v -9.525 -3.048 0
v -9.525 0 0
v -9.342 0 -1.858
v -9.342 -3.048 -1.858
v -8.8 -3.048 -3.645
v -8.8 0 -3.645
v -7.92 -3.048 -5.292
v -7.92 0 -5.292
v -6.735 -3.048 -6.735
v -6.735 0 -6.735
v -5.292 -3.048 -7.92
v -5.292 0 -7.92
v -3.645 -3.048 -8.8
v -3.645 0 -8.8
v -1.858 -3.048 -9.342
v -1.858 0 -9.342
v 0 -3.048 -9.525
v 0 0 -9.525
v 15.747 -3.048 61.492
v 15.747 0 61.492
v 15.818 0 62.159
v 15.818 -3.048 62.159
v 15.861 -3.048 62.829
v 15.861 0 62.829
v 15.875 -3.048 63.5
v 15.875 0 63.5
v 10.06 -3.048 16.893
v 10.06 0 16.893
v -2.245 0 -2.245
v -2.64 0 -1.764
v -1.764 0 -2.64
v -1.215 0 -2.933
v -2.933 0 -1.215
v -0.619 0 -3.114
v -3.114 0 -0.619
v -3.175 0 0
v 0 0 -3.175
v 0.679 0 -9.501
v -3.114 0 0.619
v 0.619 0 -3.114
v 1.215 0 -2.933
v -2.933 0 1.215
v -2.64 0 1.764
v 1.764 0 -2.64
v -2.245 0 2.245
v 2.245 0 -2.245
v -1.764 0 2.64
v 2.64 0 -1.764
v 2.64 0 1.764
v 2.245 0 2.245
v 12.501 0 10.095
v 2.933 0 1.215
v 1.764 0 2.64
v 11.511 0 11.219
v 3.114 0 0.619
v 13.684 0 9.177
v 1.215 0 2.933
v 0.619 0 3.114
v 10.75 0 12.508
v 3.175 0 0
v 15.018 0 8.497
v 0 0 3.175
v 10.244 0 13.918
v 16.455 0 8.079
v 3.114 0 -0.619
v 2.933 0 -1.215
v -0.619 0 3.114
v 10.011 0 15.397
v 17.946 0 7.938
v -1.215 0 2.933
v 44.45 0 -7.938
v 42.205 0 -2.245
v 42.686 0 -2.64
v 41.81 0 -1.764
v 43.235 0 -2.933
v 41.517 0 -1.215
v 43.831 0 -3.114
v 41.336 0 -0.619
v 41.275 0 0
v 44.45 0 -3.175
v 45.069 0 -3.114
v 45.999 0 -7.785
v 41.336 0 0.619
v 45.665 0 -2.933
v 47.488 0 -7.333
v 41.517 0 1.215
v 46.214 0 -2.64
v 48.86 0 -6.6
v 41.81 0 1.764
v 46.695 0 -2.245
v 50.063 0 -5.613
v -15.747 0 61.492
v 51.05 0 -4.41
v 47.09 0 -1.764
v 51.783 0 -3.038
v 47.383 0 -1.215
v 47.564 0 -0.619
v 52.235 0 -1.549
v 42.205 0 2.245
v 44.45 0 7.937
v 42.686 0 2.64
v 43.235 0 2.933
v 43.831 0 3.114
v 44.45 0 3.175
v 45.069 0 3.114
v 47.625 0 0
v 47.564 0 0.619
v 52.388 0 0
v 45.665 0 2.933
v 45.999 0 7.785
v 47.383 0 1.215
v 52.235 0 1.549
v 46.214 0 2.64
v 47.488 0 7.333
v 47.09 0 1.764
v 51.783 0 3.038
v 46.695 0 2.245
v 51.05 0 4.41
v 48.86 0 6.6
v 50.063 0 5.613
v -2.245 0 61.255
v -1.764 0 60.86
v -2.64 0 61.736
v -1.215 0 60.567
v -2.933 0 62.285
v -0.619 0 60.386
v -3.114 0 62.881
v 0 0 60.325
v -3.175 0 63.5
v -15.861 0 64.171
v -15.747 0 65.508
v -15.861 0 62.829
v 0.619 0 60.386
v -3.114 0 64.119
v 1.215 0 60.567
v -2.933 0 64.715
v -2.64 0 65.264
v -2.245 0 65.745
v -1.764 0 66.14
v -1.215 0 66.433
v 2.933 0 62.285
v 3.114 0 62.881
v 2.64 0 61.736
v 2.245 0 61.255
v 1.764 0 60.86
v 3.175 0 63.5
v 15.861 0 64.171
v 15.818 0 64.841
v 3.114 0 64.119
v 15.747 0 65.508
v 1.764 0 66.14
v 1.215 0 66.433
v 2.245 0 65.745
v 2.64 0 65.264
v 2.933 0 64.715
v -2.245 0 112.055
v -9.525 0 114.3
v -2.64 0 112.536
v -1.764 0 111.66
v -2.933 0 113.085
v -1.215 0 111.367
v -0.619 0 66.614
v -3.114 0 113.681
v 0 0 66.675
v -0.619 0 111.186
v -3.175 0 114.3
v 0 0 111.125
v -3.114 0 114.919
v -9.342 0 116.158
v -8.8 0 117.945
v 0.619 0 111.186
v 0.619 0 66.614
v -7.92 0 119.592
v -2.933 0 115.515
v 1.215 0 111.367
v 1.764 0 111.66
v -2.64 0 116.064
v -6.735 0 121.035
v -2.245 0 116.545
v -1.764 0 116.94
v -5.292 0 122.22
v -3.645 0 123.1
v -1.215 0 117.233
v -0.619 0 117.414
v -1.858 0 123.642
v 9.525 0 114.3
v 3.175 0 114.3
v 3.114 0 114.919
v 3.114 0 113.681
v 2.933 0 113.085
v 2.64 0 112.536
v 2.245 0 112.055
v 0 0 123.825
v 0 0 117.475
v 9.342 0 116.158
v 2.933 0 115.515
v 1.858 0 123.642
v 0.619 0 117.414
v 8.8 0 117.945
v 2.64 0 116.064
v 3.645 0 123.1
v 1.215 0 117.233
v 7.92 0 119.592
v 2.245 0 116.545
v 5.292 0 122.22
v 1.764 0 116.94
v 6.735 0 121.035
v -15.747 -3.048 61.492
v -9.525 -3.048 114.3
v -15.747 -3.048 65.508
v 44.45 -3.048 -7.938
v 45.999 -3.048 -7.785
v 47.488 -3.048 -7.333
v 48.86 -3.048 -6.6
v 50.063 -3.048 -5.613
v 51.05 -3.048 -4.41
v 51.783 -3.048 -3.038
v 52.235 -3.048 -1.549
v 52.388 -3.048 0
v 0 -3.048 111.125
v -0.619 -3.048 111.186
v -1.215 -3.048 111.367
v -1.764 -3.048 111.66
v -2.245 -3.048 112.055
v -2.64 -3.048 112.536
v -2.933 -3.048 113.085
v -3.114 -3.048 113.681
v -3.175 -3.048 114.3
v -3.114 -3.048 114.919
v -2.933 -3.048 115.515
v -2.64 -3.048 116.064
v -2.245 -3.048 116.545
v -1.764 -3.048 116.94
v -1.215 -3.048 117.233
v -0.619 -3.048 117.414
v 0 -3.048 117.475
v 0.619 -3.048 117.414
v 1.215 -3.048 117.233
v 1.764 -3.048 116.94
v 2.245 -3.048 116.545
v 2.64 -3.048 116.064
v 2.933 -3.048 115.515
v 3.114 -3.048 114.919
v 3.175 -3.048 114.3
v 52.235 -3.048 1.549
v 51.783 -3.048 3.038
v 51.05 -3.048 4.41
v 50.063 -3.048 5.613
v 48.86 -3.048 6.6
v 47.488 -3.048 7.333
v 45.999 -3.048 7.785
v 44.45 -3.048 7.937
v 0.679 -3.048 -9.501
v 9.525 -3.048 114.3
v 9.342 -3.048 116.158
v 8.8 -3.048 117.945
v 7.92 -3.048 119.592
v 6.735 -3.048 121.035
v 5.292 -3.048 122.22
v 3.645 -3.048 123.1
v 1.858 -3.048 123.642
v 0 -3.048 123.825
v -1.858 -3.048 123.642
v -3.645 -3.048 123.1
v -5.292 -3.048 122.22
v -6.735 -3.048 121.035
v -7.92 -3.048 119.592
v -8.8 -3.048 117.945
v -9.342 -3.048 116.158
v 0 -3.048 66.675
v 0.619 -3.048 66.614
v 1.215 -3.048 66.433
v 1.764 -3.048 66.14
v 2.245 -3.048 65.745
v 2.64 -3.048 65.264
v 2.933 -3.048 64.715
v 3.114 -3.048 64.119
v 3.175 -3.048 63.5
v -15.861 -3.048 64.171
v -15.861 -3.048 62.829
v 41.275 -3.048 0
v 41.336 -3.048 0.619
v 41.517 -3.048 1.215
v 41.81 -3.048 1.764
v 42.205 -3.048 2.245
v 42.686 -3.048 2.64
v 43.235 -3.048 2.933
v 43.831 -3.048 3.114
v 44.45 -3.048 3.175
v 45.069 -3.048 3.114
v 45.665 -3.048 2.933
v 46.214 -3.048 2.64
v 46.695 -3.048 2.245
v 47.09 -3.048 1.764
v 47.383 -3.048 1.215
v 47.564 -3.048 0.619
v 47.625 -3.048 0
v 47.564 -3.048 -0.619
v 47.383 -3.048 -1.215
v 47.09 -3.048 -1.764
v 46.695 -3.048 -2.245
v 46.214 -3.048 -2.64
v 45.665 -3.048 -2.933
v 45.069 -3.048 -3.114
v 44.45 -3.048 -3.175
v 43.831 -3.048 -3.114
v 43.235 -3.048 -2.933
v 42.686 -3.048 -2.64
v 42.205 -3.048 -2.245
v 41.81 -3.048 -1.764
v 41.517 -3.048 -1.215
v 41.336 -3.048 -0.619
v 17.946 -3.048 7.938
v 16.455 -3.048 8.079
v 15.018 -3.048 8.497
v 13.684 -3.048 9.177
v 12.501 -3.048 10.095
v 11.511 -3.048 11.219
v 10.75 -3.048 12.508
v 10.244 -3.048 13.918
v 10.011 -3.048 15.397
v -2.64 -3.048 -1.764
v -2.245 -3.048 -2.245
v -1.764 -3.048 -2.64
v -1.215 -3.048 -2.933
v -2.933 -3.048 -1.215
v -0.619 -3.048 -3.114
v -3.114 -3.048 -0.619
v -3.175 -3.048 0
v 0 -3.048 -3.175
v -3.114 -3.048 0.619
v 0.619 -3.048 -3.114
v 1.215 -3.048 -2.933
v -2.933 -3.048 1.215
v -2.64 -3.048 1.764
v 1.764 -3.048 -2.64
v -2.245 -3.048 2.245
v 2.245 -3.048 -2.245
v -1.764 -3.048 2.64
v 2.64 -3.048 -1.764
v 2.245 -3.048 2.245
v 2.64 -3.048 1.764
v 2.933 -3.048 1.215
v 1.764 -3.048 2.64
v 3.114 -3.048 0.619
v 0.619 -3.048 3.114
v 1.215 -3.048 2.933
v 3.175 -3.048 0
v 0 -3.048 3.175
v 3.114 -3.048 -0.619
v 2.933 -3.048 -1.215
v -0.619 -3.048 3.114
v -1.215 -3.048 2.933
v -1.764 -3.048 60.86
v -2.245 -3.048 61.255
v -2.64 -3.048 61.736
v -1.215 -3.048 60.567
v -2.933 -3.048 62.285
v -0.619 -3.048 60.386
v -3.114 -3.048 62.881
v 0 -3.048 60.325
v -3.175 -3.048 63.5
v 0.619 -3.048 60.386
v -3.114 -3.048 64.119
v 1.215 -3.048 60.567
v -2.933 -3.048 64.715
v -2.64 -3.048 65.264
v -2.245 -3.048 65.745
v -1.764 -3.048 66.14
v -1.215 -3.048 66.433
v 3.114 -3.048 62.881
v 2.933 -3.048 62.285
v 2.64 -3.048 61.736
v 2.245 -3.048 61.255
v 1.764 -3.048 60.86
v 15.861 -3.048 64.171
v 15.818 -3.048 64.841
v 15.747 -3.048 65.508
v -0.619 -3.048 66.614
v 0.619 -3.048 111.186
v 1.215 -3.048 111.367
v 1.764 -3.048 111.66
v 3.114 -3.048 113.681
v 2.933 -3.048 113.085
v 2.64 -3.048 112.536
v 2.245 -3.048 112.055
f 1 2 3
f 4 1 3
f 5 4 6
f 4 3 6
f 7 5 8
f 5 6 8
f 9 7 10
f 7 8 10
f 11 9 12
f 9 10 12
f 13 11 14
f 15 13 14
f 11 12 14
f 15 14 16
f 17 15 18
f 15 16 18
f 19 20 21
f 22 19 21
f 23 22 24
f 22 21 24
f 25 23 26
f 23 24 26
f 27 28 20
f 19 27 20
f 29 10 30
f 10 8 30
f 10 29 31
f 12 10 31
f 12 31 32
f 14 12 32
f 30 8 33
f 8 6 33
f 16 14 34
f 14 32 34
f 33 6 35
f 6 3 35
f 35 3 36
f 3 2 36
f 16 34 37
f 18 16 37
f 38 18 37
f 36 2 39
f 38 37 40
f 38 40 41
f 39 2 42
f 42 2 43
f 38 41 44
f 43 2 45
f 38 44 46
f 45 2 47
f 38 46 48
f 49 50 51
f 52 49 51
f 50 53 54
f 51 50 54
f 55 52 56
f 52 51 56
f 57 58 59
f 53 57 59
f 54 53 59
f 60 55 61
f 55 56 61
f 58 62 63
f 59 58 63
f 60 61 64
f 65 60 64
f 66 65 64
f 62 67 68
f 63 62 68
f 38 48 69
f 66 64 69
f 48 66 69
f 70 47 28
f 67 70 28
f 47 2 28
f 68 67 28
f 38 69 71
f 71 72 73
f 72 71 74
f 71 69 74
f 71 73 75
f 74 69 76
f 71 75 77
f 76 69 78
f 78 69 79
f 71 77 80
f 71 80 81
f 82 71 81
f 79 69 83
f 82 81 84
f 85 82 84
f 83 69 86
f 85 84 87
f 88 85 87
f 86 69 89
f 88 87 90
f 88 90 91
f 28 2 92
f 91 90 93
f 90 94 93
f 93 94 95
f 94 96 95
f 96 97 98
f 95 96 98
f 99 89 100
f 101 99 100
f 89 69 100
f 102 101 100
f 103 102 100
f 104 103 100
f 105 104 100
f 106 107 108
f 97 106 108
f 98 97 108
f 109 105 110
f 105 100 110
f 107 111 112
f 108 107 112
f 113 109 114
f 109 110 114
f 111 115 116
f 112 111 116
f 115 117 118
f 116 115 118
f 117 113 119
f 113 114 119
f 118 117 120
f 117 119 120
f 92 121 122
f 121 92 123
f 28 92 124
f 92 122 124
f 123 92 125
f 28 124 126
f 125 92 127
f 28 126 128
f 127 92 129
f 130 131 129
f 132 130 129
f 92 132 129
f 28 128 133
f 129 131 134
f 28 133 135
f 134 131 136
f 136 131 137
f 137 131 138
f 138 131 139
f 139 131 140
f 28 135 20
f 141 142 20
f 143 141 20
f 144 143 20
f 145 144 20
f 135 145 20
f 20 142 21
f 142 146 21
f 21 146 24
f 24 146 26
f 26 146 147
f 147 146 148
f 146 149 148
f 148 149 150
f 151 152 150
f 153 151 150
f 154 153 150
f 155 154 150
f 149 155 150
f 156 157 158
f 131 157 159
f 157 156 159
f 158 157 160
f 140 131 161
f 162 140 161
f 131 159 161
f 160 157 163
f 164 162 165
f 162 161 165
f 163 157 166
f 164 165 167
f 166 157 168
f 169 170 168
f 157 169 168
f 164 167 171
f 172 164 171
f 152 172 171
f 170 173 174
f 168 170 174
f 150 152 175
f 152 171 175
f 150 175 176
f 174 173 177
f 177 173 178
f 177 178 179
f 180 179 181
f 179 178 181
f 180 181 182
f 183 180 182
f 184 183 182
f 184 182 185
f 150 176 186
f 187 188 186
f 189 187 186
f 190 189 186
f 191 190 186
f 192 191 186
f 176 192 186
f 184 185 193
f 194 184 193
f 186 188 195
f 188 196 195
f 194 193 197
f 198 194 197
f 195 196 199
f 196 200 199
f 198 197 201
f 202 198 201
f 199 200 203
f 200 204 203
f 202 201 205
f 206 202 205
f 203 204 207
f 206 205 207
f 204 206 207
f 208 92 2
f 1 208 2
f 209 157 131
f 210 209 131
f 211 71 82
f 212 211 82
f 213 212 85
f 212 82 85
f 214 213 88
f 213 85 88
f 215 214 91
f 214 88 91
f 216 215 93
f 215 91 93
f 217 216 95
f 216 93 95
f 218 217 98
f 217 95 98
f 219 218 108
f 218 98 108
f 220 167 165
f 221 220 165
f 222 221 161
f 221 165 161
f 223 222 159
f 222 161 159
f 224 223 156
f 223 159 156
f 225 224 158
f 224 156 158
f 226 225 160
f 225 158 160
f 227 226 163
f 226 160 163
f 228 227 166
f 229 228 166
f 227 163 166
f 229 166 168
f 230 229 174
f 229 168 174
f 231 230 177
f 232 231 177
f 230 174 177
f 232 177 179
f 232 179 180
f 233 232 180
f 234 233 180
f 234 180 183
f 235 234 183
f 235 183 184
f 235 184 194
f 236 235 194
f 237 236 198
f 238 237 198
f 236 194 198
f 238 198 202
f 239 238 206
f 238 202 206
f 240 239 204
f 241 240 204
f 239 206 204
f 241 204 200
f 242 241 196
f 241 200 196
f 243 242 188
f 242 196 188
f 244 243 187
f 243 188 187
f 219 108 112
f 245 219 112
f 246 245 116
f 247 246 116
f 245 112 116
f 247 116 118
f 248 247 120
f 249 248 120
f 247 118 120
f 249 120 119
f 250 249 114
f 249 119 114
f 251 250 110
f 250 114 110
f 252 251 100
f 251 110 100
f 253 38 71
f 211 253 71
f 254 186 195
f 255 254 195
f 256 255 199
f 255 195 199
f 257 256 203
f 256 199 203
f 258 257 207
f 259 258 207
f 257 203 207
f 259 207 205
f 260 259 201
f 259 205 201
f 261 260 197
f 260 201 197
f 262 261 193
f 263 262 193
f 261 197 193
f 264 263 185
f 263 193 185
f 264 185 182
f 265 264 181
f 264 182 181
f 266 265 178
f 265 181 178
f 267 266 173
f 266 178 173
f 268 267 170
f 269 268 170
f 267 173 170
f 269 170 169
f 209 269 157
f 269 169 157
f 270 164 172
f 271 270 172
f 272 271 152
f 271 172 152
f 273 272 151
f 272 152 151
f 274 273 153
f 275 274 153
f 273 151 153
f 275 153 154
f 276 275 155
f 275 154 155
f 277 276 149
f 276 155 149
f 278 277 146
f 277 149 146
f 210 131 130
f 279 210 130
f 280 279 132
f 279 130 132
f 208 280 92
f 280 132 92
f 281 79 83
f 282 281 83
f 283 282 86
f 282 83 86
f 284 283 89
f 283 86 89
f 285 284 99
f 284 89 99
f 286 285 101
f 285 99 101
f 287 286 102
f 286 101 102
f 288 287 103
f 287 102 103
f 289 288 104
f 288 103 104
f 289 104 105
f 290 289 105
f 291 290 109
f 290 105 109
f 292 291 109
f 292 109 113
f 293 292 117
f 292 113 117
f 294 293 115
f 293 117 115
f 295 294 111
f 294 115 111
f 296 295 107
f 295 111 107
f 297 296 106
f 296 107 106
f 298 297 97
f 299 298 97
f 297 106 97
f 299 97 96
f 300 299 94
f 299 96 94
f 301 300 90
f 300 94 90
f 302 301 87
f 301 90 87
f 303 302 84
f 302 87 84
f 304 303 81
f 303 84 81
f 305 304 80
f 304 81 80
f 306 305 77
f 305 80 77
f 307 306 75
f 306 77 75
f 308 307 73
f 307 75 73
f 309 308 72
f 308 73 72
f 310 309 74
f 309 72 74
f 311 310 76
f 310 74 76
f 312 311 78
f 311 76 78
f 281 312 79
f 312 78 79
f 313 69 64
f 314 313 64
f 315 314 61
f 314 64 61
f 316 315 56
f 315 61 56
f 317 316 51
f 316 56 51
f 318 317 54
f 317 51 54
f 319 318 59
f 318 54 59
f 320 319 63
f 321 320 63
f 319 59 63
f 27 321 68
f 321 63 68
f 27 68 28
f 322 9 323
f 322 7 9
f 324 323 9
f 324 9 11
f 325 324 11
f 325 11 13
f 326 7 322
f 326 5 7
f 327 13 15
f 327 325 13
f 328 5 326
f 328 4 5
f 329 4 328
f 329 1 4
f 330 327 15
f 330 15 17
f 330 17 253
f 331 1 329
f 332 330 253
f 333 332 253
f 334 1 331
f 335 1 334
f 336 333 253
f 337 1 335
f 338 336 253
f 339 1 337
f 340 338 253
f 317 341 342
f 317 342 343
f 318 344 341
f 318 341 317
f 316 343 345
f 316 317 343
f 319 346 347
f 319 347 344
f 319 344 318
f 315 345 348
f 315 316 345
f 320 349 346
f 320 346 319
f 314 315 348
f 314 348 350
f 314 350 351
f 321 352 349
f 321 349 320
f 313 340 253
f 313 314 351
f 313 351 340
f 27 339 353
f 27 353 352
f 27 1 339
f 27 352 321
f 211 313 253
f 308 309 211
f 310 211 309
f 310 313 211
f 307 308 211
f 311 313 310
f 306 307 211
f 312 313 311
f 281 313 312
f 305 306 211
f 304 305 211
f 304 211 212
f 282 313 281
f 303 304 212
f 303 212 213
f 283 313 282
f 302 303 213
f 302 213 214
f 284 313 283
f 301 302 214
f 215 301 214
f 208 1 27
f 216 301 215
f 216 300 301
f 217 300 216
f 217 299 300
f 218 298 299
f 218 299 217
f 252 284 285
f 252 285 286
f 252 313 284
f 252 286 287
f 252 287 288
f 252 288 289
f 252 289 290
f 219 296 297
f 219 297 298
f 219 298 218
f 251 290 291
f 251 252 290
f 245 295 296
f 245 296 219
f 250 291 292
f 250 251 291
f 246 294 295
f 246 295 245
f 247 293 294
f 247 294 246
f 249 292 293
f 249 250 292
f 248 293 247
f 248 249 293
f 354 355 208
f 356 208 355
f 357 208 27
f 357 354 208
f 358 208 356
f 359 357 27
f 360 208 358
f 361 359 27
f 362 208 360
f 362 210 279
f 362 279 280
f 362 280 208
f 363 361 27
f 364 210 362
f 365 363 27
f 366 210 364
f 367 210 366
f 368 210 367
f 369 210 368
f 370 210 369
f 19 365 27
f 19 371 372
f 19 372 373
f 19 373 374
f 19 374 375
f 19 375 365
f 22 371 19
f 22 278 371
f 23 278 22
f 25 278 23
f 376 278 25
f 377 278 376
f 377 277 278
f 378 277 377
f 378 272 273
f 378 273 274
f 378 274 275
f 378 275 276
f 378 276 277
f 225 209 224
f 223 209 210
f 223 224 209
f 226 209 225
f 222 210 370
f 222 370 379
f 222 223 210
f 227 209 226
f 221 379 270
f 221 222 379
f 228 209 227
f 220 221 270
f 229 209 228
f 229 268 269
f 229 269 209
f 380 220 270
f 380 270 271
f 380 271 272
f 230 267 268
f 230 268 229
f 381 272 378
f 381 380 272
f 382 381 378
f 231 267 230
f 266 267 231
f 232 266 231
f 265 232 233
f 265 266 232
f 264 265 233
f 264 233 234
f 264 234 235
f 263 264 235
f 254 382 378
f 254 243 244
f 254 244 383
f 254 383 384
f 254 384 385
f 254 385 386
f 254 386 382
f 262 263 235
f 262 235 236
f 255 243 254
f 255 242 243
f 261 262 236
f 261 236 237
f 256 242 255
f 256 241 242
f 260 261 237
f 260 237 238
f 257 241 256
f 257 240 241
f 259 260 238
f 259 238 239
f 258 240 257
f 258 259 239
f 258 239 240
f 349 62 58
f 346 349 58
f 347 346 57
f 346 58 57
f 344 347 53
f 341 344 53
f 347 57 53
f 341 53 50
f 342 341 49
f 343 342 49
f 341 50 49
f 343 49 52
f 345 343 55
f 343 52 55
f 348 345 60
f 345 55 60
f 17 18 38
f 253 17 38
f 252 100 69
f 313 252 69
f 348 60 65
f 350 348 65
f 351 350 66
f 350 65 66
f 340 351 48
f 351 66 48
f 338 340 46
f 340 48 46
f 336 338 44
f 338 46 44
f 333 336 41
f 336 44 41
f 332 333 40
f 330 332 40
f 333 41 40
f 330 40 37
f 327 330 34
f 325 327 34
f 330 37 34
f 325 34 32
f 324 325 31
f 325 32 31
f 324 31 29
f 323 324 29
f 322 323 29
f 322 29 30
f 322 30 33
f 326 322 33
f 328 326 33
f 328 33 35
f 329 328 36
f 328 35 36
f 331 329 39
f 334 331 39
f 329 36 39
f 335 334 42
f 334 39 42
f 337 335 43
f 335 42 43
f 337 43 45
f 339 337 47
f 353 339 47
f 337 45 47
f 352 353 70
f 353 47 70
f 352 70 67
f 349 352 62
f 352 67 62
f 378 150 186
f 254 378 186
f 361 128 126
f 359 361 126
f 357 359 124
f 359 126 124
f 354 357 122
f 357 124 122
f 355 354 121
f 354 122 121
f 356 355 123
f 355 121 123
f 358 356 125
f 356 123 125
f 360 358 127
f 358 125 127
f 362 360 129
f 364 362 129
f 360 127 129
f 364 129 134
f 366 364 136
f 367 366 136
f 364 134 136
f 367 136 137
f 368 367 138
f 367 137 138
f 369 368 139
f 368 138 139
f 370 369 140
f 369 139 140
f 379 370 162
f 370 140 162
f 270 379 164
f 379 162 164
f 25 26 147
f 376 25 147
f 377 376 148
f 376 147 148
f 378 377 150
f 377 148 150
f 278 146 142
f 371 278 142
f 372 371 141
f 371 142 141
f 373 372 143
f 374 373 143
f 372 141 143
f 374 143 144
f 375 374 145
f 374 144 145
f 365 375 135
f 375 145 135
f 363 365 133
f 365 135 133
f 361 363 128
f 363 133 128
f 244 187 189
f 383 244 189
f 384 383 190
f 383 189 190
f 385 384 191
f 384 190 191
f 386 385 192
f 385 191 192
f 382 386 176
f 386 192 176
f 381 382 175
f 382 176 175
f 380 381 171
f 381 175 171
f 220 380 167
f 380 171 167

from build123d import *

# Parameters (mm, degrees)
F1_DEPTH = 3.048


with BuildPart() as f1:
    # F0 (on Front) → F1 (new body)
    with BuildSketch(Plane.XZ):
        with BuildLine():
            Line((-9.525, 114.3), (-15.7474569047, 65.5082893304))
            ThreePointArc((-15.7474569047, 65.5082893304), (-10.4912828548, 75.4142187767), (0, 79.375))
            Line((0, 79.375), (0, 104.775))
            ThreePointArc((0, 104.775), (-6.7351920908, 107.5648079092), (-9.525, 114.3))
        make_face()
        with BuildLine():
            Line((0, 104.775), (0, 79.375))
            ThreePointArc((0, 79.375), (10.4912828548, 75.4142187767), (15.7474569047, 65.5082893304))
            Line((15.7474569047, 65.5082893304), (9.525, 114.3))
            ThreePointArc((9.525, 114.3), (6.7351920908, 107.5648079092), (0, 104.775))
        make_face()
        with BuildLine():
            ThreePointArc((9.525, 114.3), (0, 123.825), (-9.525, 114.3))
            ThreePointArc((-9.525, 114.3), (-6.7351920908, 107.5648079092), (0, 104.775))
            ThreePointArc((0, 104.775), (6.7351920908, 107.5648079092), (9.525, 114.3))
        make_face()
        with BuildLine():
            ThreePointArc((3.175, 114.3), (2.2450640303, 112.0549359697), (0, 111.125))
            ThreePointArc((0, 111.125), (-2.2450640303, 116.5450640303), (3.175, 114.3))
        make_face(mode=Mode.SUBTRACT)
        with BuildLine():
            ThreePointArc((-15.7474569047, 61.4917106696), (-10.4912828548, 51.5857812233), (0, 47.625))
            Line((0, 47.625), (0, 60.325))
            ThreePointArc((0, 60.325), (-3.175, 63.5), (0, 66.675))
            Line((0, 66.675), (0, 79.375))
            ThreePointArc((0, 79.375), (-10.4912828548, 75.4142187767), (-15.7474569047, 65.5082893304))
            ThreePointArc((-15.7474569047, 65.5082893304), (-15.875, 63.5), (-15.7474569047, 61.4917106696))
        make_face()
        with BuildLine():
            ThreePointArc((-9.525, 0), (-6.7351920908, 6.7351920908), (0, 9.525))
            Line((0, 9.525), (0, 47.625))
            ThreePointArc((0, 47.625), (-10.4912828548, 51.5857812233), (-15.7474569047, 61.4917106696))
            Line((-15.7474569047, 61.4917106696), (-9.525, 0))
        make_face()
        with BuildLine():
            Line((0, 47.625), (0, 9.525))
            ThreePointArc((0, 9.525), (6.7351920908, 6.7351920908), (9.525, 0))
            Line((9.525, 0), (36.5125, 0))
            ThreePointArc((36.5125, 0), (38.8373399243, 5.6126600757), (44.45, 7.9375))
            Line((44.45, 7.9375), (17.9461215627, 7.9375))
            ThreePointArc((17.9461215627, 7.9375), (11.9794807993, 10.6336655463), (10.0597951449, 16.8934512966))
            Line((10.0597951449, 16.8934512966), (15.7474569047, 61.4917106696))
            ThreePointArc((15.7474569047, 61.4917106696), (10.4912828548, 51.5857812233), (0, 47.625))
        make_face()
        with BuildLine():
            ThreePointArc((3.175, 0), (-2.2450640303, -2.2450640303), (0, 3.175))
            Line((0, 3.175), (0, 9.525))
            ThreePointArc((0, 9.525), (-6.7351920908, 6.7351920908), (-9.525, 0))
            ThreePointArc((-9.525, 0), (-6.7351920908, -6.7351920908), (0, -9.525))
            Line((0, -9.525), (0.6794904459, -9.5007324841))
            ThreePointArc((0.6794904459, -9.5007324841), (6.9712901065, -6.4905114784), (9.525, 0))
            Line((9.525, 0), (3.175, 0))
        make_face()
        with BuildLine():
            Line((0, 9.525), (0, 3.175))
            ThreePointArc((0, 3.175), (2.2450640303, 2.2450640303), (3.175, 0))
            Line((3.175, 0), (9.525, 0))
            ThreePointArc((9.525, 0), (6.7351920908, 6.7351920908), (0, 9.525))
        make_face()
        with BuildLine():
            Line((36.5125, 0), (9.525, 0))
            ThreePointArc((9.525, 0), (6.9712901065, -6.4905114784), (0.6794904459, -9.5007324841))
            Line((0.6794904459, -9.5007324841), (44.45, -7.9375))
            ThreePointArc((44.45, -7.9375), (38.8373399243, -5.6126600757), (36.5125, 0))
        make_face()
        with BuildLine():
            ThreePointArc((44.45, 7.9375), (38.8373399243, 5.6126600757), (36.5125, 0))
            ThreePointArc((36.5125, 0), (38.8373399243, -5.6126600757), (44.45, -7.9375))
            ThreePointArc((44.45, -7.9375), (50.0626600757, -5.6126600757), (52.3875, 0))
            ThreePointArc((52.3875, 0), (50.0626600757, 5.6126600757), (44.45, 7.9375))
        make_face()
        with BuildLine():
            ThreePointArc((47.625, 0), (44.45, -3.175), (41.275, 0))
            ThreePointArc((41.275, 0), (44.45, 3.175), (47.625, 0))
        make_face(mode=Mode.SUBTRACT)
        with BuildLine():
            Line((0, 60.325), (0, 47.625))
            ThreePointArc((0, 47.625), (10.4912828548, 51.5857812233), (15.7474569047, 61.4917106696))
            ThreePointArc((15.7474569047, 61.4917106696), (15.8430821396, 62.4938323604), (15.875, 63.5))
            ThreePointArc((15.875, 63.5), (15.8430821396, 64.5061676396), (15.7474569047, 65.5082893304))
            ThreePointArc((15.7474569047, 65.5082893304), (10.4912828548, 75.4142187767), (0, 79.375))
            Line((0, 79.375), (0, 66.675))
            ThreePointArc((0, 66.675), (2.2450640303, 65.7450640303), (3.175, 63.5))
            ThreePointArc((3.175, 63.5), (2.2450640303, 61.2549359697), (0, 60.325))
        make_face()
    extrude(amount=F1_DEPTH)


solid = f1.part
